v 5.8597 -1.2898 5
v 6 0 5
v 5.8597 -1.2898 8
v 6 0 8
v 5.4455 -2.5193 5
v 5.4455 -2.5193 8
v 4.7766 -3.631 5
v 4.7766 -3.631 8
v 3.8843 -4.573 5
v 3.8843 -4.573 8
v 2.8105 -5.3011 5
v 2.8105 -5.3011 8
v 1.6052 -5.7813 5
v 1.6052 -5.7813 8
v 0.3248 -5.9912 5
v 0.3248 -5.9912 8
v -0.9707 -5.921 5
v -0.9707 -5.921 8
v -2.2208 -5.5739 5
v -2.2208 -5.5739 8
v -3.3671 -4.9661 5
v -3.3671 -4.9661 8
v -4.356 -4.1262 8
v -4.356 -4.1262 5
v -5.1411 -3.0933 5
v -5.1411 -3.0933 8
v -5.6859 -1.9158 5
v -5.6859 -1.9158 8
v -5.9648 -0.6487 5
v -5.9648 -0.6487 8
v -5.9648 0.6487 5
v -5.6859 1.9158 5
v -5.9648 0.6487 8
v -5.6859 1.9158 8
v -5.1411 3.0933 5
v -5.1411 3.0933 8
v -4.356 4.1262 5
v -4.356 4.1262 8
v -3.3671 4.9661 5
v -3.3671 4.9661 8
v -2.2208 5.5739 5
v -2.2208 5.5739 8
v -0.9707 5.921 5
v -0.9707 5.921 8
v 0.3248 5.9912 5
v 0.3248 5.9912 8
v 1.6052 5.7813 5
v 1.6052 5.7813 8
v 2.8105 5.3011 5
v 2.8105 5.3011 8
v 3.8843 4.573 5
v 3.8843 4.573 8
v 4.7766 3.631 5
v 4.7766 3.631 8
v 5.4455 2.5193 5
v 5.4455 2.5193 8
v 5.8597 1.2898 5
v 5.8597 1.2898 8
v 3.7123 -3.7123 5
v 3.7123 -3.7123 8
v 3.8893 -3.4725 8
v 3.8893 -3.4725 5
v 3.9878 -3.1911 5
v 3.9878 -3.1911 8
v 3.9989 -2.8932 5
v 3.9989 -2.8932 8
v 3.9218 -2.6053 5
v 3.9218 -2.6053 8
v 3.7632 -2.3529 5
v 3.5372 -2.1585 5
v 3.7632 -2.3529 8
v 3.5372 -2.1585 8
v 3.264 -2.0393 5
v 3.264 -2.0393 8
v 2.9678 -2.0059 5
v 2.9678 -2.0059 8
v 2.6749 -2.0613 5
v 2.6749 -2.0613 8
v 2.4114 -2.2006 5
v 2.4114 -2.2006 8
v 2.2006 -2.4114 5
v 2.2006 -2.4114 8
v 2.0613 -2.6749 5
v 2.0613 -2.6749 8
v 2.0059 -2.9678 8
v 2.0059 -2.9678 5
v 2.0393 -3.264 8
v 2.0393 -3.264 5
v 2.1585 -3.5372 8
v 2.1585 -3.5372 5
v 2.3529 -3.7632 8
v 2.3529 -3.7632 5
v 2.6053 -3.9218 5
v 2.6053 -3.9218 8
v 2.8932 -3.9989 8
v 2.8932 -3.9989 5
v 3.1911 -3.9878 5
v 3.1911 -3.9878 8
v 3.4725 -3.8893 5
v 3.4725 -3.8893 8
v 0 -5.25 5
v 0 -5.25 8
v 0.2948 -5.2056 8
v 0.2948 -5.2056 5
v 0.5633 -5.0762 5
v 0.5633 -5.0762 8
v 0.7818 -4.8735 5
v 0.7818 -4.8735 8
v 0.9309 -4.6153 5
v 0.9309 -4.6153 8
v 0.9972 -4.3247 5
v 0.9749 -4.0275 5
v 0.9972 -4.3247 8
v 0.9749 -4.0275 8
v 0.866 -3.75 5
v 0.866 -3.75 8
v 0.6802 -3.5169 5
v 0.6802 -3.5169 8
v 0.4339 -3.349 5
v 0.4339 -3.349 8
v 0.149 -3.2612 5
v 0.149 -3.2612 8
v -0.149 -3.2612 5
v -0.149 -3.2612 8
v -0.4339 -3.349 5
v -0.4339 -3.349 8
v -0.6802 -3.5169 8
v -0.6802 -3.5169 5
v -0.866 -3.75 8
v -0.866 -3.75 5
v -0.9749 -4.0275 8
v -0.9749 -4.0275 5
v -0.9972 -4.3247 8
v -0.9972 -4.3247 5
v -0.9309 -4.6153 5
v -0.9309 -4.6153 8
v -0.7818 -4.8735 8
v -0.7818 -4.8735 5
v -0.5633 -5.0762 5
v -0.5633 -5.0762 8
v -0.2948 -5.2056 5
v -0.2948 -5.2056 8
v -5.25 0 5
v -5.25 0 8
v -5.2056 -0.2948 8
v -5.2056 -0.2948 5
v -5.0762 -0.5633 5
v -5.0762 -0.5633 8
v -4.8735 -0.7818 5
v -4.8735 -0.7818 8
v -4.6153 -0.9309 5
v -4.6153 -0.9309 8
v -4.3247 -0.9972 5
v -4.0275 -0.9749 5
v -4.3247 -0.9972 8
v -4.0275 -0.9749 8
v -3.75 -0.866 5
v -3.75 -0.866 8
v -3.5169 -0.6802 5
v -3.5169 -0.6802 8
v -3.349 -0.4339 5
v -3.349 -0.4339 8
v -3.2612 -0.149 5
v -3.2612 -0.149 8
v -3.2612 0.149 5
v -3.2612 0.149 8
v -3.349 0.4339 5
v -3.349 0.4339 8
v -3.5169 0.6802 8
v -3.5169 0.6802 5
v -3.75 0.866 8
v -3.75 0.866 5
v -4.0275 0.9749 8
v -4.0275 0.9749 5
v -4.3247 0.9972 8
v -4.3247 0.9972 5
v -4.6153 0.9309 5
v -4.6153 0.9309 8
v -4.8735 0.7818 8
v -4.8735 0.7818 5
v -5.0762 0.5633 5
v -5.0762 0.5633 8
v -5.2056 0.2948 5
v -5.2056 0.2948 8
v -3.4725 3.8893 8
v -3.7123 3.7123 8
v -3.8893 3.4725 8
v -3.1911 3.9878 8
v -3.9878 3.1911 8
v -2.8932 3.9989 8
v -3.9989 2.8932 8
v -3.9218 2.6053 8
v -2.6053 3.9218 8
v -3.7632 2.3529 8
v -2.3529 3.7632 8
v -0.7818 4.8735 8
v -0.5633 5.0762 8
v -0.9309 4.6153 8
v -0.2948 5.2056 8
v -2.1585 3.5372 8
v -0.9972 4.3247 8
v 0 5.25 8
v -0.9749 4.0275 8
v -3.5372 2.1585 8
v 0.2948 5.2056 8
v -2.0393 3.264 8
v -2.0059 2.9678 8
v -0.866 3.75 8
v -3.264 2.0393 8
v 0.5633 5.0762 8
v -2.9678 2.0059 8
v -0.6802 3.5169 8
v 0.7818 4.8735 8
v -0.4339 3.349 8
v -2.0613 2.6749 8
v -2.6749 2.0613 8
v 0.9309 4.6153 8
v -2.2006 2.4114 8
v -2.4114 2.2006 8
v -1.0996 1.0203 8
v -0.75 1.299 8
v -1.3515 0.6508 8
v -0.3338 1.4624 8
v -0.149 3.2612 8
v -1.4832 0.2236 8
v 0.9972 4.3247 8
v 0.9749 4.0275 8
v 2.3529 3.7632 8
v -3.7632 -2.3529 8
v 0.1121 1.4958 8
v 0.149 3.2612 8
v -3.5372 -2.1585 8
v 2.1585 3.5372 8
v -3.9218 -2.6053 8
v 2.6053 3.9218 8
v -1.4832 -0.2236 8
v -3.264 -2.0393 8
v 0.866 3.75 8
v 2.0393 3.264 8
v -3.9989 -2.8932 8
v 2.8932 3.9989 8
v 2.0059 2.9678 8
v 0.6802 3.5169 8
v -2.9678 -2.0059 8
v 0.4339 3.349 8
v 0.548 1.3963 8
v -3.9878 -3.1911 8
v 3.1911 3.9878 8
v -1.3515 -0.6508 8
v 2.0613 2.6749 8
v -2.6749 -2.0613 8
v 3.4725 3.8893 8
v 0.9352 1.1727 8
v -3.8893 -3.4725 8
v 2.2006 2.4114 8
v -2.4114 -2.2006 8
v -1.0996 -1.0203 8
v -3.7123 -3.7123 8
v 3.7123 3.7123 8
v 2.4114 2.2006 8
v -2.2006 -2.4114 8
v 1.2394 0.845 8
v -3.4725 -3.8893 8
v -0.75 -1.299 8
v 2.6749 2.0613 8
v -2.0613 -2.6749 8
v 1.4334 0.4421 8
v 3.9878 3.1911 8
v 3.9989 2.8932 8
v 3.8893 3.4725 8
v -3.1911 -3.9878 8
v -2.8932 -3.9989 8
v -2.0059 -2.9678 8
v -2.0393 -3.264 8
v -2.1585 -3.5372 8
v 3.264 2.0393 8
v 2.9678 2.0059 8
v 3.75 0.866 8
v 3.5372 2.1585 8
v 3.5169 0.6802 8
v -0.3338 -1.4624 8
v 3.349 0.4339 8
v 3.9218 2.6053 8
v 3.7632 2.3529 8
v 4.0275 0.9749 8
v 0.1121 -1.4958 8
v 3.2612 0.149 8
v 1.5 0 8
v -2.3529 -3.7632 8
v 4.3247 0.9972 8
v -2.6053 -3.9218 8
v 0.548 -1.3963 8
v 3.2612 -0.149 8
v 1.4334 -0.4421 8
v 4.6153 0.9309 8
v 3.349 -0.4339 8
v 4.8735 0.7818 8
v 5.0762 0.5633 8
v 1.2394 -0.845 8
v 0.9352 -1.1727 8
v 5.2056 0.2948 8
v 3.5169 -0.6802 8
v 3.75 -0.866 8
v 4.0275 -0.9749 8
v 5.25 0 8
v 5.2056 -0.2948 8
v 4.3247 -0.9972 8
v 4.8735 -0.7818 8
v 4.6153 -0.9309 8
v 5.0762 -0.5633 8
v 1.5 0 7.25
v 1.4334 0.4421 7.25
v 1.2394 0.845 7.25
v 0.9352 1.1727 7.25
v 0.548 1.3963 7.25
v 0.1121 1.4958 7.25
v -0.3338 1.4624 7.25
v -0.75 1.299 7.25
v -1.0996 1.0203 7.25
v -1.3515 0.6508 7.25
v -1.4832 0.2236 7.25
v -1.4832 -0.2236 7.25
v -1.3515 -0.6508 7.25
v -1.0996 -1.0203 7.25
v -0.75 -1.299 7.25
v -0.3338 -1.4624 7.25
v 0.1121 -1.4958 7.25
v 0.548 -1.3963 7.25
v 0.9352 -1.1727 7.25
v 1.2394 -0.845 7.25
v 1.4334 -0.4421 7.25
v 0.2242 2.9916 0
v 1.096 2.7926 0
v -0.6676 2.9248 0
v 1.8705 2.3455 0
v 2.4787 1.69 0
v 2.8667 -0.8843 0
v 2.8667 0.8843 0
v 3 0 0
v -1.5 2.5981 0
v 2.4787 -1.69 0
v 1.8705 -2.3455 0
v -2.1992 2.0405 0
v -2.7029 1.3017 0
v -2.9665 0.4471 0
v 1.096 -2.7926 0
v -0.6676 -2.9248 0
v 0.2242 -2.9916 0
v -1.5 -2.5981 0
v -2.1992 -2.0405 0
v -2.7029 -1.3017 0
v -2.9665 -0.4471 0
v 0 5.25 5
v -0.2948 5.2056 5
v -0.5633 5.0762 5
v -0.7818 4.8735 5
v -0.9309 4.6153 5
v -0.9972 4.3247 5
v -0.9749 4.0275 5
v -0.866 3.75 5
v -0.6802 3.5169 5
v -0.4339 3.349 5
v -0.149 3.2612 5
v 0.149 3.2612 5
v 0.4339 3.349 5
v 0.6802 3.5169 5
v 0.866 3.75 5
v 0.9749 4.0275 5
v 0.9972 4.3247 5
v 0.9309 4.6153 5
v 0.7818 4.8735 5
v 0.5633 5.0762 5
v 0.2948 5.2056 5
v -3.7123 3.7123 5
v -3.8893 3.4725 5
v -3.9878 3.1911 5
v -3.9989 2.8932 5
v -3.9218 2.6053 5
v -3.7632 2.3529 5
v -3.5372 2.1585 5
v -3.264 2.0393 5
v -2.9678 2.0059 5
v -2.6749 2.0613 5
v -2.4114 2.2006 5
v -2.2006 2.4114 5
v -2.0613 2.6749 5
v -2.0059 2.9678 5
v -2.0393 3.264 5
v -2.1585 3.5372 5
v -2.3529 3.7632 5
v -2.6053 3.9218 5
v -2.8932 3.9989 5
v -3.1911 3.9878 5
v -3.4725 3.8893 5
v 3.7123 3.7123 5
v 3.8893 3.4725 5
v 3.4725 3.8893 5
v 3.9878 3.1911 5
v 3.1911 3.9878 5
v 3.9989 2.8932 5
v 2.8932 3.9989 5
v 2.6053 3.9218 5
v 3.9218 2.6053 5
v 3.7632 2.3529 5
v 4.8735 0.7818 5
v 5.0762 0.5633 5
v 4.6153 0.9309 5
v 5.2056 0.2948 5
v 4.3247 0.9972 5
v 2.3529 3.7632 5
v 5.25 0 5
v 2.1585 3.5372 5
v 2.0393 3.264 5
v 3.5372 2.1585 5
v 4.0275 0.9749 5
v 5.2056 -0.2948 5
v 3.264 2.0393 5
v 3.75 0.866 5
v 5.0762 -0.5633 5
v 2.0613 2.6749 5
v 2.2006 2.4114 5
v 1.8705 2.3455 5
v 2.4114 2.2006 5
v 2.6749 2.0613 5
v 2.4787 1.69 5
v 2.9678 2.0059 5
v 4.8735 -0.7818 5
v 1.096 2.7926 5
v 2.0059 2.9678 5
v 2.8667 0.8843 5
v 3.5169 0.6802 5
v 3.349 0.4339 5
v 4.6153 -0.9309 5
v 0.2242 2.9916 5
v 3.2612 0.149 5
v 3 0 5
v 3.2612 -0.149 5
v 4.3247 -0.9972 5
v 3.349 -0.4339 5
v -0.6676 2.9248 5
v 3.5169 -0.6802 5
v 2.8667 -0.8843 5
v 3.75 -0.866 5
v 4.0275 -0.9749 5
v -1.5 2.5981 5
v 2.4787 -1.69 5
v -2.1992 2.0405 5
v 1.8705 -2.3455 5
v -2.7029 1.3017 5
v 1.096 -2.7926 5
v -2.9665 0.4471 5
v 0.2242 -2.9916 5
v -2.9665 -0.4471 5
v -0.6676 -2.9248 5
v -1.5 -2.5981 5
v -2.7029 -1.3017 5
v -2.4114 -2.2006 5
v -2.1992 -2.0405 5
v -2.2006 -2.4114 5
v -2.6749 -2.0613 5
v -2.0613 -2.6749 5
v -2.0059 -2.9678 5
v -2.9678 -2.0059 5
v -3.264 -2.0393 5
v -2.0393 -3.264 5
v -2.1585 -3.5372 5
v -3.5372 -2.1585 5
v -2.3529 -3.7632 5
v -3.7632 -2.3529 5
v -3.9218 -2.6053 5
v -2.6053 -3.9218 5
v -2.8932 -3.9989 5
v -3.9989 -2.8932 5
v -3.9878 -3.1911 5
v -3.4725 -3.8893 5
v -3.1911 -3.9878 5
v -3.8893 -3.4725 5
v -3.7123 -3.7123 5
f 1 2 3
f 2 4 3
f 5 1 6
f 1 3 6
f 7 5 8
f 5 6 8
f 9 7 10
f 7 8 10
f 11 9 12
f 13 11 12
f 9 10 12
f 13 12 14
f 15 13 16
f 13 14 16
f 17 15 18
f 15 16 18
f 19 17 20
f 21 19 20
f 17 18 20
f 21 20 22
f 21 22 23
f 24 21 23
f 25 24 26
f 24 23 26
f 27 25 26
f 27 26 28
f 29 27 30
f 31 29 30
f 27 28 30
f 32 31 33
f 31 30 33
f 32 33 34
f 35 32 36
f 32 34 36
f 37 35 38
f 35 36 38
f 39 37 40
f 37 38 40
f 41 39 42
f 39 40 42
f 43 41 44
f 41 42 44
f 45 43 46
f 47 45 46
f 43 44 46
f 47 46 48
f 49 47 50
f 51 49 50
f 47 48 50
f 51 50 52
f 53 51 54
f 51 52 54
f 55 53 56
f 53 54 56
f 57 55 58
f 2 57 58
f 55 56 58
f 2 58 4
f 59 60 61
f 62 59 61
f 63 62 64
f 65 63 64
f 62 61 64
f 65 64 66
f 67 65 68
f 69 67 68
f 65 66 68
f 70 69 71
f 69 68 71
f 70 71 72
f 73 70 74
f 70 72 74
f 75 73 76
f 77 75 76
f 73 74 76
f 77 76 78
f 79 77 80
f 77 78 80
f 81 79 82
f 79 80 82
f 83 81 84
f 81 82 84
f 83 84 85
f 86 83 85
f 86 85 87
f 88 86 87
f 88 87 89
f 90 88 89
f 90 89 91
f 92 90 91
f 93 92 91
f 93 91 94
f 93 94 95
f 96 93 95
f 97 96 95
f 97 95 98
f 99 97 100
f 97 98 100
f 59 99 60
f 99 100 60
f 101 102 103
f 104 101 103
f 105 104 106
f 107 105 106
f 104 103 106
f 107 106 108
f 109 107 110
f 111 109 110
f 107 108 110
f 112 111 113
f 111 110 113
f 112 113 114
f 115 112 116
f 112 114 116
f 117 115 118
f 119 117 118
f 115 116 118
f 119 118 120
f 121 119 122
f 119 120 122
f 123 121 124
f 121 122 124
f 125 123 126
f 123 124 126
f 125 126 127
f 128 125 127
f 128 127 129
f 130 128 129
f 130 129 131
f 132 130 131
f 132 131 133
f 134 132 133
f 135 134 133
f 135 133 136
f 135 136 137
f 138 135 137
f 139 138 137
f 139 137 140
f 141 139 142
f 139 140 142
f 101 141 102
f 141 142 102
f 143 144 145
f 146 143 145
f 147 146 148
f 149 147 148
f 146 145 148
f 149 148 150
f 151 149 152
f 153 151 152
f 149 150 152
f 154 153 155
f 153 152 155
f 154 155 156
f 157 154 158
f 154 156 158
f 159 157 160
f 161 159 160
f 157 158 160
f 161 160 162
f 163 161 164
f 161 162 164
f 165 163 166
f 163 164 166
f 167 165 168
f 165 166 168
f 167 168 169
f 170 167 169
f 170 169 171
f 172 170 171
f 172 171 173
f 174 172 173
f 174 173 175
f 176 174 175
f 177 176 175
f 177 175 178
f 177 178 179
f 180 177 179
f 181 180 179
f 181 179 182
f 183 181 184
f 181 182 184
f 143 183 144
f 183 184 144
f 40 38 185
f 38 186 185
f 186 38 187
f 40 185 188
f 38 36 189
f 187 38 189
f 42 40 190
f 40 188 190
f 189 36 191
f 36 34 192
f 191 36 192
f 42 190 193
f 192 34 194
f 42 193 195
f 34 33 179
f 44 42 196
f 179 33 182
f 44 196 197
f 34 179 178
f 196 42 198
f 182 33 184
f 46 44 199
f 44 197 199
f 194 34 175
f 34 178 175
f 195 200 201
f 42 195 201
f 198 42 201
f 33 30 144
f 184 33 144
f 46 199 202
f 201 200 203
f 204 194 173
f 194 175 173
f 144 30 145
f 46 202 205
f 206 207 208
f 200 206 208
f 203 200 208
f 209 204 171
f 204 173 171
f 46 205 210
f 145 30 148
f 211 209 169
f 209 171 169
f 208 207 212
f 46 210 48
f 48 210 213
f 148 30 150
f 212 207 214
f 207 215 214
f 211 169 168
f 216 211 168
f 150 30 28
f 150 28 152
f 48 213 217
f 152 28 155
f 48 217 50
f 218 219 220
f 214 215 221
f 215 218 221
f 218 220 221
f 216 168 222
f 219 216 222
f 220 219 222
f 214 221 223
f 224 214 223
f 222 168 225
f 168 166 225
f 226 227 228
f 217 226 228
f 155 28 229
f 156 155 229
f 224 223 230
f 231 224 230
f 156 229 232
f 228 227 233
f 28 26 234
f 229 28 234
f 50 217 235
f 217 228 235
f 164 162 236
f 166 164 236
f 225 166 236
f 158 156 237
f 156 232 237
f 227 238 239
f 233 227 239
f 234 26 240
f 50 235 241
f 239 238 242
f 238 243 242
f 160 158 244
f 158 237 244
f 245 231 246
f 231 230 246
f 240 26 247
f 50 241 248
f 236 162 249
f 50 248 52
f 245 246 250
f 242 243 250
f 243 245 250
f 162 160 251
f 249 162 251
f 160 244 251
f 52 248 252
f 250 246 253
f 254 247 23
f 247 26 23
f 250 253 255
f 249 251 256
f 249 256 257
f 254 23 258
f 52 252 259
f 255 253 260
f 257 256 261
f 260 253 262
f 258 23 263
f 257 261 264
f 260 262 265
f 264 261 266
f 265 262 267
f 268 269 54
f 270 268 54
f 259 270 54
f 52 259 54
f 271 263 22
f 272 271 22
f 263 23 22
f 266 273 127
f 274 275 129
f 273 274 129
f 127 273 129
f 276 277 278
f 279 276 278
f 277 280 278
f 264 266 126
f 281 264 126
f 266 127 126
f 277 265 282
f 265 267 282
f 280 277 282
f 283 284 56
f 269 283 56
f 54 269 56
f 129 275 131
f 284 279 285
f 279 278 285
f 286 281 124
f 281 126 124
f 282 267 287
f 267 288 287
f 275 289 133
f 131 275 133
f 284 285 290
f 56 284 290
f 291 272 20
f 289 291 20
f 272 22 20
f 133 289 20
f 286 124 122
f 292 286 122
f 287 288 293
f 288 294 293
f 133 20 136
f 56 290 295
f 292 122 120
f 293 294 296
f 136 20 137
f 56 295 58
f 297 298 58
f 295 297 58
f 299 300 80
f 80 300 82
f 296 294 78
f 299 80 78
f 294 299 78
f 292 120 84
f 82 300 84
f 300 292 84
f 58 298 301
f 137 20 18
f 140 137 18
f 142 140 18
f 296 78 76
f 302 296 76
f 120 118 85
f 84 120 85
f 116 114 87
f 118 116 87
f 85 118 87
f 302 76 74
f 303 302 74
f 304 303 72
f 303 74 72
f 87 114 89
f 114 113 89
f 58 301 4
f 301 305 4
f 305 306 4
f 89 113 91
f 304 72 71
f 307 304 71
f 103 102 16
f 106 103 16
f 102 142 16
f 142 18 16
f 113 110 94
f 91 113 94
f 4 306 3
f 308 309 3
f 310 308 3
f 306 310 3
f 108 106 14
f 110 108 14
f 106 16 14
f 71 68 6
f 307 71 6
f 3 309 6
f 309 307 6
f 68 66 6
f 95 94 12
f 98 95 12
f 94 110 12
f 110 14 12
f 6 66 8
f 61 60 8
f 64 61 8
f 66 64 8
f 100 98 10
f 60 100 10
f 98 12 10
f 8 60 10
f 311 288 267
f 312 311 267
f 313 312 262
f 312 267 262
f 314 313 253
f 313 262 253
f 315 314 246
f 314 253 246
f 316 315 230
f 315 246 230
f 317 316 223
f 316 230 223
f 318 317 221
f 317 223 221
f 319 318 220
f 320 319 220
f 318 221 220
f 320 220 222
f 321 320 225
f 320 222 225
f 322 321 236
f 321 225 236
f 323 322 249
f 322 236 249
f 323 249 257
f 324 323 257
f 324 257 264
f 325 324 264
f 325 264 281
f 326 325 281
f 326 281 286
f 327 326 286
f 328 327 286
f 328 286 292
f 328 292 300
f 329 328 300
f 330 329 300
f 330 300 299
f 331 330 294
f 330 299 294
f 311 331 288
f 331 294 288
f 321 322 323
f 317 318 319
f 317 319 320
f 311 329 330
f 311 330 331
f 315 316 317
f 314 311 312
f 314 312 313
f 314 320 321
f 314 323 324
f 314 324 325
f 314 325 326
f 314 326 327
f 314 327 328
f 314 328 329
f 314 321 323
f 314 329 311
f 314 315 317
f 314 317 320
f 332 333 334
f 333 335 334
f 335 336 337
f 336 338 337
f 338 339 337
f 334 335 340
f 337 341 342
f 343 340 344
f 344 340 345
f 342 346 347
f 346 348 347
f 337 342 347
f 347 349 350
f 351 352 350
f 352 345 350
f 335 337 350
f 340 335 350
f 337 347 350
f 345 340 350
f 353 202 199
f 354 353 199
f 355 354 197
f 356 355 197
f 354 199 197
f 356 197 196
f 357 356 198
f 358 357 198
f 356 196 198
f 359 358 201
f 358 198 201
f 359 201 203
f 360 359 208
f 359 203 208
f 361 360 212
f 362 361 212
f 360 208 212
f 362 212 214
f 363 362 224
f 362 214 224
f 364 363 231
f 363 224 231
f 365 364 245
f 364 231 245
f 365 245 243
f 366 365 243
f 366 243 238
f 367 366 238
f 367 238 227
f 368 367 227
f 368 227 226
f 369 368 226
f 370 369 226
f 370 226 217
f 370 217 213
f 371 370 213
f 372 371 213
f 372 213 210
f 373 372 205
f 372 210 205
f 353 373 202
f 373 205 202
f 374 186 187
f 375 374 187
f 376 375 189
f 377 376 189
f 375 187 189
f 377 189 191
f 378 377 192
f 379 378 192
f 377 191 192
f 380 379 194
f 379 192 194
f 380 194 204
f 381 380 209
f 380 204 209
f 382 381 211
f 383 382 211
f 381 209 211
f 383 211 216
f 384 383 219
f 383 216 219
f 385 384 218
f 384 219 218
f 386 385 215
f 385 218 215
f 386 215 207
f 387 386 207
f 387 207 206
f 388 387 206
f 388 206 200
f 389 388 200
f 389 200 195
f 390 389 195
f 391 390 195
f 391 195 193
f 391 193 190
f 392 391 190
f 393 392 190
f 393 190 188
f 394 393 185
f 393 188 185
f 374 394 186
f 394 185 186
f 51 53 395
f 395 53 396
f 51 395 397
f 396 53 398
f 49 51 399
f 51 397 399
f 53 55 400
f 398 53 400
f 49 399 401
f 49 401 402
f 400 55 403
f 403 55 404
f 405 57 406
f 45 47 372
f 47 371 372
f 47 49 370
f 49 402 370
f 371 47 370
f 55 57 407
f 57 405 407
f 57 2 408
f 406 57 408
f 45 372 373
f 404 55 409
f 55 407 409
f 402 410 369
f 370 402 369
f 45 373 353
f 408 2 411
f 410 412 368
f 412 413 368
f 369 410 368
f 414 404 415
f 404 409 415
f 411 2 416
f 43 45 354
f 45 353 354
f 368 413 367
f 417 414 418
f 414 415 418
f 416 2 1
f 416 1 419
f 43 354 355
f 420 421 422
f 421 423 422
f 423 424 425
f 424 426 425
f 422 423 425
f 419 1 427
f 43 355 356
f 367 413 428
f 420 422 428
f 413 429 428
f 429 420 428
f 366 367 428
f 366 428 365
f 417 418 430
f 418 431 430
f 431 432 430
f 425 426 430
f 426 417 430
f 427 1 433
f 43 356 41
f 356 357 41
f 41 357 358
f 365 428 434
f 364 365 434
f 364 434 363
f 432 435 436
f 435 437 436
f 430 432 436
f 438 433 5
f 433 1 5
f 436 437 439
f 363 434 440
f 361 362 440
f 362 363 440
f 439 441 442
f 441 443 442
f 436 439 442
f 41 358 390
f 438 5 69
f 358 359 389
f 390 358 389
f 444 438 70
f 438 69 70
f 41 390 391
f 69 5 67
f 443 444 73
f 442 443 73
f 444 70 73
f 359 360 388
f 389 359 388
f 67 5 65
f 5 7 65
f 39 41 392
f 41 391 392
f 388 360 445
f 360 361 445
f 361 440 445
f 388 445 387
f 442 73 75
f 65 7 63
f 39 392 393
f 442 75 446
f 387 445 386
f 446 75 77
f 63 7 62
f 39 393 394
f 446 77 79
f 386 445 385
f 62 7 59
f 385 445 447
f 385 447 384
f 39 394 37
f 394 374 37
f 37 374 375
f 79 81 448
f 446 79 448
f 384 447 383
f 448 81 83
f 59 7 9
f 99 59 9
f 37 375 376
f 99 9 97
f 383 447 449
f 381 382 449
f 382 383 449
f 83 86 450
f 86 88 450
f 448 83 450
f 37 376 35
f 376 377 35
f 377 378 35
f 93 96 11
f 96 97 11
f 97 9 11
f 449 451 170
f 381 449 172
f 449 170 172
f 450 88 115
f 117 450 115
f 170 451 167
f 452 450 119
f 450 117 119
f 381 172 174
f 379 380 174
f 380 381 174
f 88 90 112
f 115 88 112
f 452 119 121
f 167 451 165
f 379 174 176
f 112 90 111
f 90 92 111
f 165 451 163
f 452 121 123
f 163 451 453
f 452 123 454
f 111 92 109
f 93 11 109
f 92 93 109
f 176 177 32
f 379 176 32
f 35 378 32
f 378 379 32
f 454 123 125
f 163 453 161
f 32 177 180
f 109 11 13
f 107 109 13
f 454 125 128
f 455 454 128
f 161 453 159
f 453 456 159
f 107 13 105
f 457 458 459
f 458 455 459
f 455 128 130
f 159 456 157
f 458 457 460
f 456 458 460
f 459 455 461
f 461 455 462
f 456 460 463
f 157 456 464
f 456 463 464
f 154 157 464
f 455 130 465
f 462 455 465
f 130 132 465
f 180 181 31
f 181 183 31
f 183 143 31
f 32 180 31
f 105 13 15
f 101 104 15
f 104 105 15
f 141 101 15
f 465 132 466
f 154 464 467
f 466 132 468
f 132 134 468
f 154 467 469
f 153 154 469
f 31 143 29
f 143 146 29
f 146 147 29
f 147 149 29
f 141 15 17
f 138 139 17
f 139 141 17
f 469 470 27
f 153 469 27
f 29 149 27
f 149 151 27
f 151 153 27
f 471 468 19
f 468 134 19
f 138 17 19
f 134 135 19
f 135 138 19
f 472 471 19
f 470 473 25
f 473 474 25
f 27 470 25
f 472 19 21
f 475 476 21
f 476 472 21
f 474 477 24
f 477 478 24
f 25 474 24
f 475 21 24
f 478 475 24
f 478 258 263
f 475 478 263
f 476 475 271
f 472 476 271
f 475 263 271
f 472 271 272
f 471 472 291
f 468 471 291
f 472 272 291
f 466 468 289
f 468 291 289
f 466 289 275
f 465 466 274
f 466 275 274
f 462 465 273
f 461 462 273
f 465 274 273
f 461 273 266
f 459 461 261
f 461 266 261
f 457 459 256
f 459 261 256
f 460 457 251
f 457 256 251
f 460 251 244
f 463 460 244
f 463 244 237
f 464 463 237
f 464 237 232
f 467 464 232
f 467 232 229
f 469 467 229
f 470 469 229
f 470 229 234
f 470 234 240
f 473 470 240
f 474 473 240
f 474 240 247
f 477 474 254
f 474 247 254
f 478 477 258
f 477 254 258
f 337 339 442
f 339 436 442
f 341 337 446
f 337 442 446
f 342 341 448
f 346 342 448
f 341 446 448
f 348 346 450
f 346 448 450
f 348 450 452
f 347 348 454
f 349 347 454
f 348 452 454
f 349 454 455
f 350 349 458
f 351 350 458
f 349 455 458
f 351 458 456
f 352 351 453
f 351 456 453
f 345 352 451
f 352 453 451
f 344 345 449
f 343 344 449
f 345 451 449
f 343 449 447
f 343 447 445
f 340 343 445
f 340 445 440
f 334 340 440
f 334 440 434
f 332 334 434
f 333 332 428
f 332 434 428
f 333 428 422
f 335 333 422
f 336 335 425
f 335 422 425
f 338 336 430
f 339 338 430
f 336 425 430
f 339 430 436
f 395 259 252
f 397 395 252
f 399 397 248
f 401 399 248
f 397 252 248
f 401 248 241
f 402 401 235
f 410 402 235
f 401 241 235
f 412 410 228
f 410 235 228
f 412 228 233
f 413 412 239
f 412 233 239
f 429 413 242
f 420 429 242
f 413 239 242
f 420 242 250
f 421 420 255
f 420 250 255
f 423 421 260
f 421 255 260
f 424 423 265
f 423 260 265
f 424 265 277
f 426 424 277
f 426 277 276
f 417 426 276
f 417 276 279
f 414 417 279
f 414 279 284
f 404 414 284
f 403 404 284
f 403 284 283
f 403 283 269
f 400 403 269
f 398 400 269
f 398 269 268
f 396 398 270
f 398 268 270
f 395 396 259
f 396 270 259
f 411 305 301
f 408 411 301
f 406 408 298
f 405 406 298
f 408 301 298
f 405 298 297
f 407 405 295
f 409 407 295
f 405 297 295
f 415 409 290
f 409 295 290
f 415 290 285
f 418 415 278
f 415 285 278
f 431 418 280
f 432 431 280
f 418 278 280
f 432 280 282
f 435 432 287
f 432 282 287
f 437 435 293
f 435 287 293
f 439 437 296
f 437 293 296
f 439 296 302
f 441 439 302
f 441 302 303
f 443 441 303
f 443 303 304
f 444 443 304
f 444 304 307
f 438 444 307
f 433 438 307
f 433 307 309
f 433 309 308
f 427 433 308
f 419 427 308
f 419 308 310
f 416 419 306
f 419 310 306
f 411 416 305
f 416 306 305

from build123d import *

# Parameters (mm, degrees)
F2_R            = 1
F3_DEPTH        = 3
F3_COPIES_COUNT = 8
F4_R            = 1.5
F5_DEPTH        = 0.75


# Not quite as in the source:
# - a pattern or mirror of a feature is missing from the dataset's text; its kind, count and spacing are read off the source's solid


with BuildPart() as f1:
    # F0 (on Front) → F1 (revolve)
    with BuildSketch(Plane.XZ):
        Polygon((0, 8), (0, 0), (3, 0), (3, 5), (6, 5), (6, 8), align=None)
    revolve(axis=Axis((0, 0, 4), (0, 0, -1)))

    # F2 (on face) → F3 (cut, through all)
    with BuildSketch(Plane.XY.offset(8)):
        with Locations((4.25, 0)):
            Circle(F2_R)
    f3 = extrude(amount=-F3_DEPTH, mode=Mode.SUBTRACT)

    # F3_copies: F3 ×8 about axis
    f3_copies_axis = Axis((0, 0, 0), (0, 0, 1))
    for i in range(1, F3_COPIES_COUNT):
        add(f3.rotate(f3_copies_axis, i * 360 / F3_COPIES_COUNT), mode=Mode.SUBTRACT)

    # F4 (on face) → F5 (cut)
    with BuildSketch(Plane.XY.offset(8)):
        Circle(F4_R)
    extrude(amount=-F5_DEPTH, mode=Mode.SUBTRACT)


solid = f1.part
